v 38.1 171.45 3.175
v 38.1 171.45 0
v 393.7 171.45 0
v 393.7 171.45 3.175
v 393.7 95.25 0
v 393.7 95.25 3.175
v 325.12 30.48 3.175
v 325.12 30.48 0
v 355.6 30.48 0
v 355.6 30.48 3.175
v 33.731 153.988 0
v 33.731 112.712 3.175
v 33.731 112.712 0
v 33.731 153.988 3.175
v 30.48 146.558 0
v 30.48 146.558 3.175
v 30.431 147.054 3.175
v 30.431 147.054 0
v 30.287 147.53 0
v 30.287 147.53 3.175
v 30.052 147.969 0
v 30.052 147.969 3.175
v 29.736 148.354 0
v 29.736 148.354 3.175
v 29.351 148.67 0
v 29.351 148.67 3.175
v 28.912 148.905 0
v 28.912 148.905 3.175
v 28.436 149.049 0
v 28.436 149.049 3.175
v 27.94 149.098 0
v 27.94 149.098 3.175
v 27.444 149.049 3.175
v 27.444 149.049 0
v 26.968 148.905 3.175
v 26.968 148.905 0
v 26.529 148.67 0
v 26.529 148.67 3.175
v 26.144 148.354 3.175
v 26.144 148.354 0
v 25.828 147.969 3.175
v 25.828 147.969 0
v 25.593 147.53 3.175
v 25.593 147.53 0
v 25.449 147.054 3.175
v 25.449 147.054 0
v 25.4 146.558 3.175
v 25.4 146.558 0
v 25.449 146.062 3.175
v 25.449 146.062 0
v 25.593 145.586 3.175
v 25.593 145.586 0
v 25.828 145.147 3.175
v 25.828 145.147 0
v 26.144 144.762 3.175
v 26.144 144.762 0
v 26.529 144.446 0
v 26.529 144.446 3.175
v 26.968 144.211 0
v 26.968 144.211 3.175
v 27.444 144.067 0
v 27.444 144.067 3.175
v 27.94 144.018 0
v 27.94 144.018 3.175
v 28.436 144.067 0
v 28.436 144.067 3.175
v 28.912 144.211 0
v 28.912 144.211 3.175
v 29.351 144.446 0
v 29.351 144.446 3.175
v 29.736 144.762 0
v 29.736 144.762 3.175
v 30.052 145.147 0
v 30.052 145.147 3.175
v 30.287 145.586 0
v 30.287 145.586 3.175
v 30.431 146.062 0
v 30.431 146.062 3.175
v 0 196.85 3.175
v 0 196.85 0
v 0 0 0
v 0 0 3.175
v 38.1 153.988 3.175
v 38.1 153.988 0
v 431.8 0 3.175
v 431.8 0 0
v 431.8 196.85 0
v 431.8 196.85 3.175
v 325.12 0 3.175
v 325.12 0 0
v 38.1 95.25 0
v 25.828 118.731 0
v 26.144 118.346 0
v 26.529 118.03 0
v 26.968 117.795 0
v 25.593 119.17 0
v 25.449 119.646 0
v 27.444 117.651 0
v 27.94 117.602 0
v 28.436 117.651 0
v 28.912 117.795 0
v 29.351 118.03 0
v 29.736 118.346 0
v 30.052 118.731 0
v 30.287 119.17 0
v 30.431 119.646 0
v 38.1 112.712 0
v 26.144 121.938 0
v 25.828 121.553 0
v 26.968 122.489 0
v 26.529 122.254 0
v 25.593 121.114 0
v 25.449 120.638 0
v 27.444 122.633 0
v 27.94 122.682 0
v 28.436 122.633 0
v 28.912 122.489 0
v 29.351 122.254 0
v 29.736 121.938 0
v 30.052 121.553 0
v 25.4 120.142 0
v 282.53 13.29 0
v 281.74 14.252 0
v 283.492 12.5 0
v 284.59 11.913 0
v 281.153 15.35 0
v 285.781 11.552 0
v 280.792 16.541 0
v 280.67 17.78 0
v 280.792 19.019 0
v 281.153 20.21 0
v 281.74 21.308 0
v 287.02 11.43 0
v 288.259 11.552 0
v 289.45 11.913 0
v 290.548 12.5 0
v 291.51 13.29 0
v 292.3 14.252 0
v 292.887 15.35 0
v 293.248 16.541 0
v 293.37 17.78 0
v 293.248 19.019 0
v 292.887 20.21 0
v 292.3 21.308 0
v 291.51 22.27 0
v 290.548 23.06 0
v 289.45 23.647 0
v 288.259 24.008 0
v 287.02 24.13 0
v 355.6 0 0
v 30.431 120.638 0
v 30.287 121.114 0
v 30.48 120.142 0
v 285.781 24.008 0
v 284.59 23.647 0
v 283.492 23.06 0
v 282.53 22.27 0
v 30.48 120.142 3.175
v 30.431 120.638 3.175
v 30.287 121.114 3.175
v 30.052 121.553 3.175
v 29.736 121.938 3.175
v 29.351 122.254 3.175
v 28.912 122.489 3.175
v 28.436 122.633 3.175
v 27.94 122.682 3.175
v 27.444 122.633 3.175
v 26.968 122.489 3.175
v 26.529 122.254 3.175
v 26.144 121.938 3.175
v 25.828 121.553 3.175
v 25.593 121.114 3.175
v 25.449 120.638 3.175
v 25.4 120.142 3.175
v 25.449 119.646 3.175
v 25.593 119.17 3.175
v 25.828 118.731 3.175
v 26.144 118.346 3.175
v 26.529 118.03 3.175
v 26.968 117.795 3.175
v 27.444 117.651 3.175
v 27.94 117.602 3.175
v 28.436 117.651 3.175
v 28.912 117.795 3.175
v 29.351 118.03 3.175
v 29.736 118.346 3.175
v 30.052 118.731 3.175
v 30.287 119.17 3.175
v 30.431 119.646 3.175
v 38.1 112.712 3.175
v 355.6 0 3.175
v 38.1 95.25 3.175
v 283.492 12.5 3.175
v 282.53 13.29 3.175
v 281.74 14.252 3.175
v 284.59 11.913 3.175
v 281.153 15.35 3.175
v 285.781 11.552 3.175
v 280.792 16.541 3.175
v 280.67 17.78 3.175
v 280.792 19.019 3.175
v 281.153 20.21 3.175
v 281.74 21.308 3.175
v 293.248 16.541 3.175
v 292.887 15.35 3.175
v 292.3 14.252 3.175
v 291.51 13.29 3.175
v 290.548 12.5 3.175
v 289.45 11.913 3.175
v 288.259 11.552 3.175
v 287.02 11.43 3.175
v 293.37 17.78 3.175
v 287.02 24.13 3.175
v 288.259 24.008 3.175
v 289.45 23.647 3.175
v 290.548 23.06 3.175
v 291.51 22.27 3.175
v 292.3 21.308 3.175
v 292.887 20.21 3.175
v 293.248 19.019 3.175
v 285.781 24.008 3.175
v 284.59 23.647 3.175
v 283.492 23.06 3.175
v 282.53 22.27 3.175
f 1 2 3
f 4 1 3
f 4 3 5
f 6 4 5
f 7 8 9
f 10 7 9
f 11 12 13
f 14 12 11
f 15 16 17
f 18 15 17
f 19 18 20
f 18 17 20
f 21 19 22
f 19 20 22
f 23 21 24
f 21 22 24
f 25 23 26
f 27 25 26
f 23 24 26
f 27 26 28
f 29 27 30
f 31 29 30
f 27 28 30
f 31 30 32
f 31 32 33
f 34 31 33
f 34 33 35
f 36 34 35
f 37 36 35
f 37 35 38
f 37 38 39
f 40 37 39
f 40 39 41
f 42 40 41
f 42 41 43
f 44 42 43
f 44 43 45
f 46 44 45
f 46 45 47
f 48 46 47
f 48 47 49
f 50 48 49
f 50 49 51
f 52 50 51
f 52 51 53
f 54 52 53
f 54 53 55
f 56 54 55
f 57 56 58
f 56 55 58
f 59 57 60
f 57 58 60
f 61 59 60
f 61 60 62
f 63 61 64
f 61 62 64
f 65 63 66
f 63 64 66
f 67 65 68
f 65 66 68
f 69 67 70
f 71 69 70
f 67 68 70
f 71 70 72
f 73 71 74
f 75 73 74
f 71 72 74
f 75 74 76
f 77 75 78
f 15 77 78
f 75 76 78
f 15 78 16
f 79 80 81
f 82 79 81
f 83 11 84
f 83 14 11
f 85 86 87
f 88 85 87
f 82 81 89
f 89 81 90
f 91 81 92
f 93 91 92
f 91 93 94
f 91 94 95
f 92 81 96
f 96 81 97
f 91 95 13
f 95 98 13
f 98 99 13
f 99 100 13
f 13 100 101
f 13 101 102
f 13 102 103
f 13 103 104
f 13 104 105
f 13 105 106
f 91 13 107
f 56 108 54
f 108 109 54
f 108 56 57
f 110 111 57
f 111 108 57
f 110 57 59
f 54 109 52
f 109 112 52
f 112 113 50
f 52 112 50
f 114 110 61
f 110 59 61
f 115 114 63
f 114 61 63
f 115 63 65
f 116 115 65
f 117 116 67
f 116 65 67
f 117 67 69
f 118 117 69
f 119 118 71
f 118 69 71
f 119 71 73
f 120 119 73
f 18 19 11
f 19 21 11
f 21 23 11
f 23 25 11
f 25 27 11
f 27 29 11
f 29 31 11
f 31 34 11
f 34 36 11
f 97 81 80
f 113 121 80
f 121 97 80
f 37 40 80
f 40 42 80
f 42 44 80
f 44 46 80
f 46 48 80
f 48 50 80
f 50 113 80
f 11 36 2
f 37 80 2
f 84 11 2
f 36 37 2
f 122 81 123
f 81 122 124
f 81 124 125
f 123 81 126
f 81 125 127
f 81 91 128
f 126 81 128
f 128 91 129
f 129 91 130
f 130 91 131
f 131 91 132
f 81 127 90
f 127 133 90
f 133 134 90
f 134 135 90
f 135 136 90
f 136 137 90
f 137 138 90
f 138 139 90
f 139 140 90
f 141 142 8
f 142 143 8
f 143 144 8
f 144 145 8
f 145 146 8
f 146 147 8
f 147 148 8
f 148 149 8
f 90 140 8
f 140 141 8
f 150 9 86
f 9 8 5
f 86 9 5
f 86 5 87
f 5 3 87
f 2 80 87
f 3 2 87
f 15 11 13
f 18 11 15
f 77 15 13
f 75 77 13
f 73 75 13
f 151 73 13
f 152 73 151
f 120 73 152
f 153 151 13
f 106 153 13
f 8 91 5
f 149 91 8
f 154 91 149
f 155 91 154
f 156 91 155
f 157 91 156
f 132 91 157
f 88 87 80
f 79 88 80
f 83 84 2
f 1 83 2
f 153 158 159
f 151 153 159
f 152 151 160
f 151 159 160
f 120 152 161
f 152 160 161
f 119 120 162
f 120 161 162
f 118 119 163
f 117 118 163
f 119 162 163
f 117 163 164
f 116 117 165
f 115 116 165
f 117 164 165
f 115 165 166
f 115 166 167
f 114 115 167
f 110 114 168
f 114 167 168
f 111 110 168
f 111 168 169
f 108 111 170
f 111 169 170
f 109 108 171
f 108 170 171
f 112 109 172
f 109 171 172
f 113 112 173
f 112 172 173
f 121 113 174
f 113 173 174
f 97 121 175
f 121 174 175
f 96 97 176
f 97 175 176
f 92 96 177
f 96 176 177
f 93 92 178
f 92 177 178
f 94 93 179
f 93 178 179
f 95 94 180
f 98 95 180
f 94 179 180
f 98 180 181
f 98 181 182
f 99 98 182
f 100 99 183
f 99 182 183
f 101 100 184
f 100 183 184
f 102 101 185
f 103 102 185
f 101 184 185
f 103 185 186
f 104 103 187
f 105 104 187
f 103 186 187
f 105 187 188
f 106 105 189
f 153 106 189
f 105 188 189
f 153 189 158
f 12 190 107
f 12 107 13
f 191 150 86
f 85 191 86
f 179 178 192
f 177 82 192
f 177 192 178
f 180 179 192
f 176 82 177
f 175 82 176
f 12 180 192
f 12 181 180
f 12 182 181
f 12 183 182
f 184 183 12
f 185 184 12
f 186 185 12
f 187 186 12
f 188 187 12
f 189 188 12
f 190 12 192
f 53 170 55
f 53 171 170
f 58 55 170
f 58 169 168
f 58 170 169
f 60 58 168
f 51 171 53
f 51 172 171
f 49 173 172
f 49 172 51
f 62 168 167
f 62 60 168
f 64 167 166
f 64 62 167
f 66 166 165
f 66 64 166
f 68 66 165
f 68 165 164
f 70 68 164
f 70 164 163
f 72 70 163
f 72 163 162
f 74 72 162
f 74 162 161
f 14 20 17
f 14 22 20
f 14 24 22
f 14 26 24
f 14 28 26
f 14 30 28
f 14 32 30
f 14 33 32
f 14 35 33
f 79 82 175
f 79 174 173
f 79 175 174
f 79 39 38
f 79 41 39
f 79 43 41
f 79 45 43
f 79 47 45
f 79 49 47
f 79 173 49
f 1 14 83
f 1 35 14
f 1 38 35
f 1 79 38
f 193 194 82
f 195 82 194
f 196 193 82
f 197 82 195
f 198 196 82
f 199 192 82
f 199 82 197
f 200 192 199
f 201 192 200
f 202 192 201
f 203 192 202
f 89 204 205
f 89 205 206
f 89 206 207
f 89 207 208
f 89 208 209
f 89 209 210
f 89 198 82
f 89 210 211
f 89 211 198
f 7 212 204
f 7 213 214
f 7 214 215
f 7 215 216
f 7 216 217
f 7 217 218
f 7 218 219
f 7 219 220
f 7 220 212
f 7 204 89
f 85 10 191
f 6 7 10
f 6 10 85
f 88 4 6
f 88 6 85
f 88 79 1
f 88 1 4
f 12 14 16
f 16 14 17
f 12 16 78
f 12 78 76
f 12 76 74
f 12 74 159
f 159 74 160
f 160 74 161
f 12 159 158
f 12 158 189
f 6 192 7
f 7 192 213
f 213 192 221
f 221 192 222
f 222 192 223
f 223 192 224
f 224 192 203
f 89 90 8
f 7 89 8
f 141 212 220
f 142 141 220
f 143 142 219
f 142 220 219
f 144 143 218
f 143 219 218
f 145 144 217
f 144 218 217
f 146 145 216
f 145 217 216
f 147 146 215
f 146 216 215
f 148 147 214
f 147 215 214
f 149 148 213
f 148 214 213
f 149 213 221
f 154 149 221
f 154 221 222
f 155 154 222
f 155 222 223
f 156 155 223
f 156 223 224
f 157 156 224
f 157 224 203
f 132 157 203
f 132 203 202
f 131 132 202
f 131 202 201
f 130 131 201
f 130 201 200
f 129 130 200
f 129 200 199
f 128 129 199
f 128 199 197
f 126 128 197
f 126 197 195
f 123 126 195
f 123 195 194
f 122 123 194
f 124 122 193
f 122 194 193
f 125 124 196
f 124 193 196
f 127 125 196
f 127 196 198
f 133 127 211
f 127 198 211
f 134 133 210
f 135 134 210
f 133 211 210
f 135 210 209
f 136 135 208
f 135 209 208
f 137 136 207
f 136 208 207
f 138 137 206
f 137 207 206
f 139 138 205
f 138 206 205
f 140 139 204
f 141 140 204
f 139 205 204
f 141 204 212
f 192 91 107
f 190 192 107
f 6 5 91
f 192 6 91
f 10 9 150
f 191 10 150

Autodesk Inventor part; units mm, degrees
ref_plane "YZ Plane" through (0, 0, 0) normal (1, 0, 0) x (0, 1, 0)
ref_plane "XZ Plane" through (0, 0, 0) normal (0, 1, 0) x (-1, 0, 0)
ref_plane "XY Plane" through (0, 0, 0) normal (0, 0, 1) x (1, 0, 0)
sketch "Sketch1" plane through (0, 0, 0) normal (0, 0, 1) x (1, 0, 0)
  line L0 (0, 0) -> (431.8, 0)
  line L1 (431.8, 0) -> (431.8, 196.85)
  line L2 (431.8, 196.85) -> (0, 196.85)
  line L3 (0, 196.85) -> (0, 0)
  line L4 (431.8, 0) -> (330.2, 0)
  line L5 (330.2, 0) -> (287.02, 0)
  line L6 (325.12, 0) -> (325.12, 30.48)
  line L7 (325.12, 30.48) -> (355.6, 30.48)
  line L8 (355.6, 30.48) -> (355.6, 0)
  line L9 (38.1, 171.45) -> (393.7, 171.45)
  line L10 (393.7, 171.45) -> (393.7, 95.25)
  line L11 (393.7, 95.25) -> (38.1, 95.25)
  line L12 (38.1, 95.25) -> (38.1, 171.45)
  line L13 (0, 196.85) -> (25.4, 196.85)
  line L14 (431.8, 196.85) -> (406.4, 196.85)
  line L15 (0, 196.85) -> (38.1, 196.85)
  line L16 (38.1, 196.85) -> (38.1, 171.45)
  line L17 (431.8, 0) -> (355.6, 0)
  line L18 (355.6, 0) -> (330.2, 0)
  line L19 (325.12, 0) -> (287.02, 0)
  point P0 (325.12, 0)
  dimension "d0" = 431.8
  dimension "d5" = 30.48
  dimension "d6" = 30.48
  dimension "d7" = 355.6
  dimension "d8" = 76.2
  dimension "d9" = 25.4
  dimension "d15" = 38.1
  dimension "d16" = 76.2
  dimension "d18" = 38.1
extrude "Extrusion1" add sketch "Sketch1" along normal blind 3.175 contours L3 L2 L1 L0 L8 L7 L6
sketch "Sketch2" plane through (0, 0, 3.175) normal (0, 0, 1) x (1, 0, 0)
  line L0 (0, 0) -> (325.12, 0) projected
  circle A0 centre (27.94, 120.142) radius 2.54
  circle A1 centre (27.94, 146.558) radius 2.54
  line L1 (38.1, 171.45) -> (393.7, 171.45) projected
  line L2 (38.1, 171.45) -> (38.1, 152.4)
  line L3 (38.1, 95.25) -> (38.1, 171.45) projected
  line L4 (38.1, 95.25) -> (38.1, 171.45) projected
  line L5 (38.1, 171.45) -> (38.1, 133.35)
  line L6 (287.02, 0) -> (287.02, 17.78)
  circle A2 centre (287.02, 17.78) radius 6.35
  dimension "d44" = 17.78
  dimension "d45" = 12.7
extrude "Extrusion2" cut sketch "Sketch2" against normal blind 25.4
sketch "Sketch4" plane through (0, 0, 3.175) normal (0, 0, 1) x (1, 0, 0)
  circle A0 centre (27.94, 146.558) radius 2.54 projected
  line L0 (27.94, 146.558) -> (27.94, 152.4)
  line L1 (27.94, 152.4) -> (38.1, 152.4)
  line L2 (38.1, 95.25) -> (38.1, 171.45) projected
  line L3 (38.1, 152.4) -> (38.1, 114.3)
  line L4 (38.1, 114.3) -> (27.94, 114.3)
  circle A1 centre (27.94, 120.142) radius 2.54 projected
  line L5 (27.94, 114.3) -> (27.94, 120.142)
  line L6 (38.1, 152.4) -> (35.56, 152.4)
  line L7 (35.56, 152.4) -> (35.56, 114.3)
  point P0 (0, 0)
  dimension "d30" = 5.842
  dimension "d31" = 38.1
  dimension "d32" = 2.54
extrude "Extrusion3" cut sketch "Sketch4" against normal blind 25.4 contours L1 L2 L4 L7
sketch "Sketch6" plane through (0, 0, 3.175) normal (0, 0, 1) x (1, 0, 0)
  line L0 (38.1, 152.4) -> (38.1, 171.45) projected
  line L1 (35.56, 153.9875) -> (38.1, 153.9875)
  line L2 (38.1, 153.9875) -> (38.1, 112.7125)
  line L3 (38.1, 112.7125) -> (33.7312, 112.7125)
  line L4 (33.7312, 112.7125) -> (33.7312, 153.9875)
  line L5 (33.7312, 153.9875) -> (35.56, 153.9875)
  point P0 (0, 0)
  dimension "d40" = 41.275
  dimension "d41" = 4.3688
extrude "Extrusion4" cut sketch "Sketch6" against normal blind 25.4
properties part number "220228 Back Piece"
